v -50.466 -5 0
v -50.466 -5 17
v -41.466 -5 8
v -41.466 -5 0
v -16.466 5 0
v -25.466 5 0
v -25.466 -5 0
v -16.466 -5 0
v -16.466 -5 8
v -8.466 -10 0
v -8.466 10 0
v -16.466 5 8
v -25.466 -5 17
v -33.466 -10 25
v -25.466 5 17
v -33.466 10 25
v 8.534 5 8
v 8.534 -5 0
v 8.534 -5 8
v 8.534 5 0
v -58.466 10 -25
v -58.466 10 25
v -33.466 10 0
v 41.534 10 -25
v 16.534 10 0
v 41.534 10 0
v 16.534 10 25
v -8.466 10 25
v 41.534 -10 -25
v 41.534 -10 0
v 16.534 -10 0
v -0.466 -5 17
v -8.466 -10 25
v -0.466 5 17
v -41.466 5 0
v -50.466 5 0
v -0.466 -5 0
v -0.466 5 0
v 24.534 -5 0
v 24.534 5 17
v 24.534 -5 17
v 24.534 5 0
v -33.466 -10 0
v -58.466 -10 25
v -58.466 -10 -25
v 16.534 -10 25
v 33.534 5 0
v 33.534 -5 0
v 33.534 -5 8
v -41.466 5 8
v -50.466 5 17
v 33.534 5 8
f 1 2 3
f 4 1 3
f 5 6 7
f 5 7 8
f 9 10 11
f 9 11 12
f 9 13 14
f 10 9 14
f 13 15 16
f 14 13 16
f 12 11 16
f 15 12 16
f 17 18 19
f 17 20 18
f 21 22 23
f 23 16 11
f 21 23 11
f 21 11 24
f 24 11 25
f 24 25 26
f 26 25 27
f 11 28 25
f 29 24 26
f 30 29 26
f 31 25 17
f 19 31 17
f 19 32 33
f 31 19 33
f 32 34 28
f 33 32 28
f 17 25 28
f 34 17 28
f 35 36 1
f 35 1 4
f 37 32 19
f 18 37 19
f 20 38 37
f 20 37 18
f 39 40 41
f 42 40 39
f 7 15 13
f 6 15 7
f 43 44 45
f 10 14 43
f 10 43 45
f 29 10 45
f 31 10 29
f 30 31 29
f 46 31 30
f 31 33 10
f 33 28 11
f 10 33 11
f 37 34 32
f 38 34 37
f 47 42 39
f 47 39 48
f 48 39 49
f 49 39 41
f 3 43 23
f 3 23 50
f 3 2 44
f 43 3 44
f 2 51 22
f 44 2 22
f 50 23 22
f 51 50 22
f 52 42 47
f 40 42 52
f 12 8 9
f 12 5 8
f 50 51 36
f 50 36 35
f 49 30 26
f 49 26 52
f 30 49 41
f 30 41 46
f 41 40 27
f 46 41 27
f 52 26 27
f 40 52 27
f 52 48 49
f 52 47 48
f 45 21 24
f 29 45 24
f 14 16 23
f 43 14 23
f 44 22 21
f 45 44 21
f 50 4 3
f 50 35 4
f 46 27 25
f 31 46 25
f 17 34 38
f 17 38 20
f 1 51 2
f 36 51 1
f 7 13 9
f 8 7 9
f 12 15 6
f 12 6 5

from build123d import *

# Parameters (mm, degrees)
F1_DEPTH      = 20
F3_DEPTH      = 5
F3_DEPTH_BACK = 5


with BuildPart() as f1:
    # F0 (on Front) → F1 (new body)
    with BuildSketch(Plane.XZ):
        Polygon((-58.466492, 25), (-58.466492, 0), (-58.466492, -25), (41.533508, -25), (41.533508, 0), (33.533508, 8), (33.533508, 0), (24.533508, 0), (24.533508, 17), (16.533508, 25), (16.533508, 0), (8.533508, 8), (8.533508, 0), (-0.466492, 0), (-0.466492, 17), (-8.466492, 25), (-8.466492, 0), (-16.466492, 8), (-16.466492, 0), (-25.466492, 0), (-25.466492, 17), (-33.466492, 25), (-33.466492, 0), (-41.466492, 8), (-41.466492, 0), (-50.466492, 0), (-50.466492, 17), align=None)
        Polygon((33.533508, 0), (33.533508, 8), (24.533508, 17), (24.533508, 0), align=None)
        Polygon((8.533508, 0), (8.533508, 8), (-0.466492, 17), (-0.466492, 0), align=None)
        Polygon((-16.466492, 8), (-25.466492, 17), (-25.466492, 0), (-16.466492, 0), align=None)
        Polygon((-41.466492, 8), (-50.466492, 17), (-50.466492, 0), (-41.466492, 0), align=None)
    extrude(amount=F1_DEPTH)


with BuildPart() as f1_1:
    # F2: moved
    add(f1.part.moved(Location((0, 10, 0))))

    # F0 (on Front) → F3 (cut, two sides)
    with BuildSketch(Plane.XZ) as f3_sk:
        Polygon((33.533508, 0), (33.533508, 8), (24.533508, 17), (24.533508, 0), align=None)
        Polygon((8.533508, 0), (8.533508, 8), (-0.466492, 17), (-0.466492, 0), align=None)
        Polygon((-16.466492, 8), (-25.466492, 17), (-25.466492, 0), (-16.466492, 0), align=None)
        Polygon((-41.466492, 8), (-50.466492, 17), (-50.466492, 0), (-41.466492, 0), align=None)
    extrude(amount=F3_DEPTH, mode=Mode.SUBTRACT)
    extrude(f3_sk.sketch, amount=-F3_DEPTH_BACK, mode=Mode.SUBTRACT)


solid = f1_1.part
